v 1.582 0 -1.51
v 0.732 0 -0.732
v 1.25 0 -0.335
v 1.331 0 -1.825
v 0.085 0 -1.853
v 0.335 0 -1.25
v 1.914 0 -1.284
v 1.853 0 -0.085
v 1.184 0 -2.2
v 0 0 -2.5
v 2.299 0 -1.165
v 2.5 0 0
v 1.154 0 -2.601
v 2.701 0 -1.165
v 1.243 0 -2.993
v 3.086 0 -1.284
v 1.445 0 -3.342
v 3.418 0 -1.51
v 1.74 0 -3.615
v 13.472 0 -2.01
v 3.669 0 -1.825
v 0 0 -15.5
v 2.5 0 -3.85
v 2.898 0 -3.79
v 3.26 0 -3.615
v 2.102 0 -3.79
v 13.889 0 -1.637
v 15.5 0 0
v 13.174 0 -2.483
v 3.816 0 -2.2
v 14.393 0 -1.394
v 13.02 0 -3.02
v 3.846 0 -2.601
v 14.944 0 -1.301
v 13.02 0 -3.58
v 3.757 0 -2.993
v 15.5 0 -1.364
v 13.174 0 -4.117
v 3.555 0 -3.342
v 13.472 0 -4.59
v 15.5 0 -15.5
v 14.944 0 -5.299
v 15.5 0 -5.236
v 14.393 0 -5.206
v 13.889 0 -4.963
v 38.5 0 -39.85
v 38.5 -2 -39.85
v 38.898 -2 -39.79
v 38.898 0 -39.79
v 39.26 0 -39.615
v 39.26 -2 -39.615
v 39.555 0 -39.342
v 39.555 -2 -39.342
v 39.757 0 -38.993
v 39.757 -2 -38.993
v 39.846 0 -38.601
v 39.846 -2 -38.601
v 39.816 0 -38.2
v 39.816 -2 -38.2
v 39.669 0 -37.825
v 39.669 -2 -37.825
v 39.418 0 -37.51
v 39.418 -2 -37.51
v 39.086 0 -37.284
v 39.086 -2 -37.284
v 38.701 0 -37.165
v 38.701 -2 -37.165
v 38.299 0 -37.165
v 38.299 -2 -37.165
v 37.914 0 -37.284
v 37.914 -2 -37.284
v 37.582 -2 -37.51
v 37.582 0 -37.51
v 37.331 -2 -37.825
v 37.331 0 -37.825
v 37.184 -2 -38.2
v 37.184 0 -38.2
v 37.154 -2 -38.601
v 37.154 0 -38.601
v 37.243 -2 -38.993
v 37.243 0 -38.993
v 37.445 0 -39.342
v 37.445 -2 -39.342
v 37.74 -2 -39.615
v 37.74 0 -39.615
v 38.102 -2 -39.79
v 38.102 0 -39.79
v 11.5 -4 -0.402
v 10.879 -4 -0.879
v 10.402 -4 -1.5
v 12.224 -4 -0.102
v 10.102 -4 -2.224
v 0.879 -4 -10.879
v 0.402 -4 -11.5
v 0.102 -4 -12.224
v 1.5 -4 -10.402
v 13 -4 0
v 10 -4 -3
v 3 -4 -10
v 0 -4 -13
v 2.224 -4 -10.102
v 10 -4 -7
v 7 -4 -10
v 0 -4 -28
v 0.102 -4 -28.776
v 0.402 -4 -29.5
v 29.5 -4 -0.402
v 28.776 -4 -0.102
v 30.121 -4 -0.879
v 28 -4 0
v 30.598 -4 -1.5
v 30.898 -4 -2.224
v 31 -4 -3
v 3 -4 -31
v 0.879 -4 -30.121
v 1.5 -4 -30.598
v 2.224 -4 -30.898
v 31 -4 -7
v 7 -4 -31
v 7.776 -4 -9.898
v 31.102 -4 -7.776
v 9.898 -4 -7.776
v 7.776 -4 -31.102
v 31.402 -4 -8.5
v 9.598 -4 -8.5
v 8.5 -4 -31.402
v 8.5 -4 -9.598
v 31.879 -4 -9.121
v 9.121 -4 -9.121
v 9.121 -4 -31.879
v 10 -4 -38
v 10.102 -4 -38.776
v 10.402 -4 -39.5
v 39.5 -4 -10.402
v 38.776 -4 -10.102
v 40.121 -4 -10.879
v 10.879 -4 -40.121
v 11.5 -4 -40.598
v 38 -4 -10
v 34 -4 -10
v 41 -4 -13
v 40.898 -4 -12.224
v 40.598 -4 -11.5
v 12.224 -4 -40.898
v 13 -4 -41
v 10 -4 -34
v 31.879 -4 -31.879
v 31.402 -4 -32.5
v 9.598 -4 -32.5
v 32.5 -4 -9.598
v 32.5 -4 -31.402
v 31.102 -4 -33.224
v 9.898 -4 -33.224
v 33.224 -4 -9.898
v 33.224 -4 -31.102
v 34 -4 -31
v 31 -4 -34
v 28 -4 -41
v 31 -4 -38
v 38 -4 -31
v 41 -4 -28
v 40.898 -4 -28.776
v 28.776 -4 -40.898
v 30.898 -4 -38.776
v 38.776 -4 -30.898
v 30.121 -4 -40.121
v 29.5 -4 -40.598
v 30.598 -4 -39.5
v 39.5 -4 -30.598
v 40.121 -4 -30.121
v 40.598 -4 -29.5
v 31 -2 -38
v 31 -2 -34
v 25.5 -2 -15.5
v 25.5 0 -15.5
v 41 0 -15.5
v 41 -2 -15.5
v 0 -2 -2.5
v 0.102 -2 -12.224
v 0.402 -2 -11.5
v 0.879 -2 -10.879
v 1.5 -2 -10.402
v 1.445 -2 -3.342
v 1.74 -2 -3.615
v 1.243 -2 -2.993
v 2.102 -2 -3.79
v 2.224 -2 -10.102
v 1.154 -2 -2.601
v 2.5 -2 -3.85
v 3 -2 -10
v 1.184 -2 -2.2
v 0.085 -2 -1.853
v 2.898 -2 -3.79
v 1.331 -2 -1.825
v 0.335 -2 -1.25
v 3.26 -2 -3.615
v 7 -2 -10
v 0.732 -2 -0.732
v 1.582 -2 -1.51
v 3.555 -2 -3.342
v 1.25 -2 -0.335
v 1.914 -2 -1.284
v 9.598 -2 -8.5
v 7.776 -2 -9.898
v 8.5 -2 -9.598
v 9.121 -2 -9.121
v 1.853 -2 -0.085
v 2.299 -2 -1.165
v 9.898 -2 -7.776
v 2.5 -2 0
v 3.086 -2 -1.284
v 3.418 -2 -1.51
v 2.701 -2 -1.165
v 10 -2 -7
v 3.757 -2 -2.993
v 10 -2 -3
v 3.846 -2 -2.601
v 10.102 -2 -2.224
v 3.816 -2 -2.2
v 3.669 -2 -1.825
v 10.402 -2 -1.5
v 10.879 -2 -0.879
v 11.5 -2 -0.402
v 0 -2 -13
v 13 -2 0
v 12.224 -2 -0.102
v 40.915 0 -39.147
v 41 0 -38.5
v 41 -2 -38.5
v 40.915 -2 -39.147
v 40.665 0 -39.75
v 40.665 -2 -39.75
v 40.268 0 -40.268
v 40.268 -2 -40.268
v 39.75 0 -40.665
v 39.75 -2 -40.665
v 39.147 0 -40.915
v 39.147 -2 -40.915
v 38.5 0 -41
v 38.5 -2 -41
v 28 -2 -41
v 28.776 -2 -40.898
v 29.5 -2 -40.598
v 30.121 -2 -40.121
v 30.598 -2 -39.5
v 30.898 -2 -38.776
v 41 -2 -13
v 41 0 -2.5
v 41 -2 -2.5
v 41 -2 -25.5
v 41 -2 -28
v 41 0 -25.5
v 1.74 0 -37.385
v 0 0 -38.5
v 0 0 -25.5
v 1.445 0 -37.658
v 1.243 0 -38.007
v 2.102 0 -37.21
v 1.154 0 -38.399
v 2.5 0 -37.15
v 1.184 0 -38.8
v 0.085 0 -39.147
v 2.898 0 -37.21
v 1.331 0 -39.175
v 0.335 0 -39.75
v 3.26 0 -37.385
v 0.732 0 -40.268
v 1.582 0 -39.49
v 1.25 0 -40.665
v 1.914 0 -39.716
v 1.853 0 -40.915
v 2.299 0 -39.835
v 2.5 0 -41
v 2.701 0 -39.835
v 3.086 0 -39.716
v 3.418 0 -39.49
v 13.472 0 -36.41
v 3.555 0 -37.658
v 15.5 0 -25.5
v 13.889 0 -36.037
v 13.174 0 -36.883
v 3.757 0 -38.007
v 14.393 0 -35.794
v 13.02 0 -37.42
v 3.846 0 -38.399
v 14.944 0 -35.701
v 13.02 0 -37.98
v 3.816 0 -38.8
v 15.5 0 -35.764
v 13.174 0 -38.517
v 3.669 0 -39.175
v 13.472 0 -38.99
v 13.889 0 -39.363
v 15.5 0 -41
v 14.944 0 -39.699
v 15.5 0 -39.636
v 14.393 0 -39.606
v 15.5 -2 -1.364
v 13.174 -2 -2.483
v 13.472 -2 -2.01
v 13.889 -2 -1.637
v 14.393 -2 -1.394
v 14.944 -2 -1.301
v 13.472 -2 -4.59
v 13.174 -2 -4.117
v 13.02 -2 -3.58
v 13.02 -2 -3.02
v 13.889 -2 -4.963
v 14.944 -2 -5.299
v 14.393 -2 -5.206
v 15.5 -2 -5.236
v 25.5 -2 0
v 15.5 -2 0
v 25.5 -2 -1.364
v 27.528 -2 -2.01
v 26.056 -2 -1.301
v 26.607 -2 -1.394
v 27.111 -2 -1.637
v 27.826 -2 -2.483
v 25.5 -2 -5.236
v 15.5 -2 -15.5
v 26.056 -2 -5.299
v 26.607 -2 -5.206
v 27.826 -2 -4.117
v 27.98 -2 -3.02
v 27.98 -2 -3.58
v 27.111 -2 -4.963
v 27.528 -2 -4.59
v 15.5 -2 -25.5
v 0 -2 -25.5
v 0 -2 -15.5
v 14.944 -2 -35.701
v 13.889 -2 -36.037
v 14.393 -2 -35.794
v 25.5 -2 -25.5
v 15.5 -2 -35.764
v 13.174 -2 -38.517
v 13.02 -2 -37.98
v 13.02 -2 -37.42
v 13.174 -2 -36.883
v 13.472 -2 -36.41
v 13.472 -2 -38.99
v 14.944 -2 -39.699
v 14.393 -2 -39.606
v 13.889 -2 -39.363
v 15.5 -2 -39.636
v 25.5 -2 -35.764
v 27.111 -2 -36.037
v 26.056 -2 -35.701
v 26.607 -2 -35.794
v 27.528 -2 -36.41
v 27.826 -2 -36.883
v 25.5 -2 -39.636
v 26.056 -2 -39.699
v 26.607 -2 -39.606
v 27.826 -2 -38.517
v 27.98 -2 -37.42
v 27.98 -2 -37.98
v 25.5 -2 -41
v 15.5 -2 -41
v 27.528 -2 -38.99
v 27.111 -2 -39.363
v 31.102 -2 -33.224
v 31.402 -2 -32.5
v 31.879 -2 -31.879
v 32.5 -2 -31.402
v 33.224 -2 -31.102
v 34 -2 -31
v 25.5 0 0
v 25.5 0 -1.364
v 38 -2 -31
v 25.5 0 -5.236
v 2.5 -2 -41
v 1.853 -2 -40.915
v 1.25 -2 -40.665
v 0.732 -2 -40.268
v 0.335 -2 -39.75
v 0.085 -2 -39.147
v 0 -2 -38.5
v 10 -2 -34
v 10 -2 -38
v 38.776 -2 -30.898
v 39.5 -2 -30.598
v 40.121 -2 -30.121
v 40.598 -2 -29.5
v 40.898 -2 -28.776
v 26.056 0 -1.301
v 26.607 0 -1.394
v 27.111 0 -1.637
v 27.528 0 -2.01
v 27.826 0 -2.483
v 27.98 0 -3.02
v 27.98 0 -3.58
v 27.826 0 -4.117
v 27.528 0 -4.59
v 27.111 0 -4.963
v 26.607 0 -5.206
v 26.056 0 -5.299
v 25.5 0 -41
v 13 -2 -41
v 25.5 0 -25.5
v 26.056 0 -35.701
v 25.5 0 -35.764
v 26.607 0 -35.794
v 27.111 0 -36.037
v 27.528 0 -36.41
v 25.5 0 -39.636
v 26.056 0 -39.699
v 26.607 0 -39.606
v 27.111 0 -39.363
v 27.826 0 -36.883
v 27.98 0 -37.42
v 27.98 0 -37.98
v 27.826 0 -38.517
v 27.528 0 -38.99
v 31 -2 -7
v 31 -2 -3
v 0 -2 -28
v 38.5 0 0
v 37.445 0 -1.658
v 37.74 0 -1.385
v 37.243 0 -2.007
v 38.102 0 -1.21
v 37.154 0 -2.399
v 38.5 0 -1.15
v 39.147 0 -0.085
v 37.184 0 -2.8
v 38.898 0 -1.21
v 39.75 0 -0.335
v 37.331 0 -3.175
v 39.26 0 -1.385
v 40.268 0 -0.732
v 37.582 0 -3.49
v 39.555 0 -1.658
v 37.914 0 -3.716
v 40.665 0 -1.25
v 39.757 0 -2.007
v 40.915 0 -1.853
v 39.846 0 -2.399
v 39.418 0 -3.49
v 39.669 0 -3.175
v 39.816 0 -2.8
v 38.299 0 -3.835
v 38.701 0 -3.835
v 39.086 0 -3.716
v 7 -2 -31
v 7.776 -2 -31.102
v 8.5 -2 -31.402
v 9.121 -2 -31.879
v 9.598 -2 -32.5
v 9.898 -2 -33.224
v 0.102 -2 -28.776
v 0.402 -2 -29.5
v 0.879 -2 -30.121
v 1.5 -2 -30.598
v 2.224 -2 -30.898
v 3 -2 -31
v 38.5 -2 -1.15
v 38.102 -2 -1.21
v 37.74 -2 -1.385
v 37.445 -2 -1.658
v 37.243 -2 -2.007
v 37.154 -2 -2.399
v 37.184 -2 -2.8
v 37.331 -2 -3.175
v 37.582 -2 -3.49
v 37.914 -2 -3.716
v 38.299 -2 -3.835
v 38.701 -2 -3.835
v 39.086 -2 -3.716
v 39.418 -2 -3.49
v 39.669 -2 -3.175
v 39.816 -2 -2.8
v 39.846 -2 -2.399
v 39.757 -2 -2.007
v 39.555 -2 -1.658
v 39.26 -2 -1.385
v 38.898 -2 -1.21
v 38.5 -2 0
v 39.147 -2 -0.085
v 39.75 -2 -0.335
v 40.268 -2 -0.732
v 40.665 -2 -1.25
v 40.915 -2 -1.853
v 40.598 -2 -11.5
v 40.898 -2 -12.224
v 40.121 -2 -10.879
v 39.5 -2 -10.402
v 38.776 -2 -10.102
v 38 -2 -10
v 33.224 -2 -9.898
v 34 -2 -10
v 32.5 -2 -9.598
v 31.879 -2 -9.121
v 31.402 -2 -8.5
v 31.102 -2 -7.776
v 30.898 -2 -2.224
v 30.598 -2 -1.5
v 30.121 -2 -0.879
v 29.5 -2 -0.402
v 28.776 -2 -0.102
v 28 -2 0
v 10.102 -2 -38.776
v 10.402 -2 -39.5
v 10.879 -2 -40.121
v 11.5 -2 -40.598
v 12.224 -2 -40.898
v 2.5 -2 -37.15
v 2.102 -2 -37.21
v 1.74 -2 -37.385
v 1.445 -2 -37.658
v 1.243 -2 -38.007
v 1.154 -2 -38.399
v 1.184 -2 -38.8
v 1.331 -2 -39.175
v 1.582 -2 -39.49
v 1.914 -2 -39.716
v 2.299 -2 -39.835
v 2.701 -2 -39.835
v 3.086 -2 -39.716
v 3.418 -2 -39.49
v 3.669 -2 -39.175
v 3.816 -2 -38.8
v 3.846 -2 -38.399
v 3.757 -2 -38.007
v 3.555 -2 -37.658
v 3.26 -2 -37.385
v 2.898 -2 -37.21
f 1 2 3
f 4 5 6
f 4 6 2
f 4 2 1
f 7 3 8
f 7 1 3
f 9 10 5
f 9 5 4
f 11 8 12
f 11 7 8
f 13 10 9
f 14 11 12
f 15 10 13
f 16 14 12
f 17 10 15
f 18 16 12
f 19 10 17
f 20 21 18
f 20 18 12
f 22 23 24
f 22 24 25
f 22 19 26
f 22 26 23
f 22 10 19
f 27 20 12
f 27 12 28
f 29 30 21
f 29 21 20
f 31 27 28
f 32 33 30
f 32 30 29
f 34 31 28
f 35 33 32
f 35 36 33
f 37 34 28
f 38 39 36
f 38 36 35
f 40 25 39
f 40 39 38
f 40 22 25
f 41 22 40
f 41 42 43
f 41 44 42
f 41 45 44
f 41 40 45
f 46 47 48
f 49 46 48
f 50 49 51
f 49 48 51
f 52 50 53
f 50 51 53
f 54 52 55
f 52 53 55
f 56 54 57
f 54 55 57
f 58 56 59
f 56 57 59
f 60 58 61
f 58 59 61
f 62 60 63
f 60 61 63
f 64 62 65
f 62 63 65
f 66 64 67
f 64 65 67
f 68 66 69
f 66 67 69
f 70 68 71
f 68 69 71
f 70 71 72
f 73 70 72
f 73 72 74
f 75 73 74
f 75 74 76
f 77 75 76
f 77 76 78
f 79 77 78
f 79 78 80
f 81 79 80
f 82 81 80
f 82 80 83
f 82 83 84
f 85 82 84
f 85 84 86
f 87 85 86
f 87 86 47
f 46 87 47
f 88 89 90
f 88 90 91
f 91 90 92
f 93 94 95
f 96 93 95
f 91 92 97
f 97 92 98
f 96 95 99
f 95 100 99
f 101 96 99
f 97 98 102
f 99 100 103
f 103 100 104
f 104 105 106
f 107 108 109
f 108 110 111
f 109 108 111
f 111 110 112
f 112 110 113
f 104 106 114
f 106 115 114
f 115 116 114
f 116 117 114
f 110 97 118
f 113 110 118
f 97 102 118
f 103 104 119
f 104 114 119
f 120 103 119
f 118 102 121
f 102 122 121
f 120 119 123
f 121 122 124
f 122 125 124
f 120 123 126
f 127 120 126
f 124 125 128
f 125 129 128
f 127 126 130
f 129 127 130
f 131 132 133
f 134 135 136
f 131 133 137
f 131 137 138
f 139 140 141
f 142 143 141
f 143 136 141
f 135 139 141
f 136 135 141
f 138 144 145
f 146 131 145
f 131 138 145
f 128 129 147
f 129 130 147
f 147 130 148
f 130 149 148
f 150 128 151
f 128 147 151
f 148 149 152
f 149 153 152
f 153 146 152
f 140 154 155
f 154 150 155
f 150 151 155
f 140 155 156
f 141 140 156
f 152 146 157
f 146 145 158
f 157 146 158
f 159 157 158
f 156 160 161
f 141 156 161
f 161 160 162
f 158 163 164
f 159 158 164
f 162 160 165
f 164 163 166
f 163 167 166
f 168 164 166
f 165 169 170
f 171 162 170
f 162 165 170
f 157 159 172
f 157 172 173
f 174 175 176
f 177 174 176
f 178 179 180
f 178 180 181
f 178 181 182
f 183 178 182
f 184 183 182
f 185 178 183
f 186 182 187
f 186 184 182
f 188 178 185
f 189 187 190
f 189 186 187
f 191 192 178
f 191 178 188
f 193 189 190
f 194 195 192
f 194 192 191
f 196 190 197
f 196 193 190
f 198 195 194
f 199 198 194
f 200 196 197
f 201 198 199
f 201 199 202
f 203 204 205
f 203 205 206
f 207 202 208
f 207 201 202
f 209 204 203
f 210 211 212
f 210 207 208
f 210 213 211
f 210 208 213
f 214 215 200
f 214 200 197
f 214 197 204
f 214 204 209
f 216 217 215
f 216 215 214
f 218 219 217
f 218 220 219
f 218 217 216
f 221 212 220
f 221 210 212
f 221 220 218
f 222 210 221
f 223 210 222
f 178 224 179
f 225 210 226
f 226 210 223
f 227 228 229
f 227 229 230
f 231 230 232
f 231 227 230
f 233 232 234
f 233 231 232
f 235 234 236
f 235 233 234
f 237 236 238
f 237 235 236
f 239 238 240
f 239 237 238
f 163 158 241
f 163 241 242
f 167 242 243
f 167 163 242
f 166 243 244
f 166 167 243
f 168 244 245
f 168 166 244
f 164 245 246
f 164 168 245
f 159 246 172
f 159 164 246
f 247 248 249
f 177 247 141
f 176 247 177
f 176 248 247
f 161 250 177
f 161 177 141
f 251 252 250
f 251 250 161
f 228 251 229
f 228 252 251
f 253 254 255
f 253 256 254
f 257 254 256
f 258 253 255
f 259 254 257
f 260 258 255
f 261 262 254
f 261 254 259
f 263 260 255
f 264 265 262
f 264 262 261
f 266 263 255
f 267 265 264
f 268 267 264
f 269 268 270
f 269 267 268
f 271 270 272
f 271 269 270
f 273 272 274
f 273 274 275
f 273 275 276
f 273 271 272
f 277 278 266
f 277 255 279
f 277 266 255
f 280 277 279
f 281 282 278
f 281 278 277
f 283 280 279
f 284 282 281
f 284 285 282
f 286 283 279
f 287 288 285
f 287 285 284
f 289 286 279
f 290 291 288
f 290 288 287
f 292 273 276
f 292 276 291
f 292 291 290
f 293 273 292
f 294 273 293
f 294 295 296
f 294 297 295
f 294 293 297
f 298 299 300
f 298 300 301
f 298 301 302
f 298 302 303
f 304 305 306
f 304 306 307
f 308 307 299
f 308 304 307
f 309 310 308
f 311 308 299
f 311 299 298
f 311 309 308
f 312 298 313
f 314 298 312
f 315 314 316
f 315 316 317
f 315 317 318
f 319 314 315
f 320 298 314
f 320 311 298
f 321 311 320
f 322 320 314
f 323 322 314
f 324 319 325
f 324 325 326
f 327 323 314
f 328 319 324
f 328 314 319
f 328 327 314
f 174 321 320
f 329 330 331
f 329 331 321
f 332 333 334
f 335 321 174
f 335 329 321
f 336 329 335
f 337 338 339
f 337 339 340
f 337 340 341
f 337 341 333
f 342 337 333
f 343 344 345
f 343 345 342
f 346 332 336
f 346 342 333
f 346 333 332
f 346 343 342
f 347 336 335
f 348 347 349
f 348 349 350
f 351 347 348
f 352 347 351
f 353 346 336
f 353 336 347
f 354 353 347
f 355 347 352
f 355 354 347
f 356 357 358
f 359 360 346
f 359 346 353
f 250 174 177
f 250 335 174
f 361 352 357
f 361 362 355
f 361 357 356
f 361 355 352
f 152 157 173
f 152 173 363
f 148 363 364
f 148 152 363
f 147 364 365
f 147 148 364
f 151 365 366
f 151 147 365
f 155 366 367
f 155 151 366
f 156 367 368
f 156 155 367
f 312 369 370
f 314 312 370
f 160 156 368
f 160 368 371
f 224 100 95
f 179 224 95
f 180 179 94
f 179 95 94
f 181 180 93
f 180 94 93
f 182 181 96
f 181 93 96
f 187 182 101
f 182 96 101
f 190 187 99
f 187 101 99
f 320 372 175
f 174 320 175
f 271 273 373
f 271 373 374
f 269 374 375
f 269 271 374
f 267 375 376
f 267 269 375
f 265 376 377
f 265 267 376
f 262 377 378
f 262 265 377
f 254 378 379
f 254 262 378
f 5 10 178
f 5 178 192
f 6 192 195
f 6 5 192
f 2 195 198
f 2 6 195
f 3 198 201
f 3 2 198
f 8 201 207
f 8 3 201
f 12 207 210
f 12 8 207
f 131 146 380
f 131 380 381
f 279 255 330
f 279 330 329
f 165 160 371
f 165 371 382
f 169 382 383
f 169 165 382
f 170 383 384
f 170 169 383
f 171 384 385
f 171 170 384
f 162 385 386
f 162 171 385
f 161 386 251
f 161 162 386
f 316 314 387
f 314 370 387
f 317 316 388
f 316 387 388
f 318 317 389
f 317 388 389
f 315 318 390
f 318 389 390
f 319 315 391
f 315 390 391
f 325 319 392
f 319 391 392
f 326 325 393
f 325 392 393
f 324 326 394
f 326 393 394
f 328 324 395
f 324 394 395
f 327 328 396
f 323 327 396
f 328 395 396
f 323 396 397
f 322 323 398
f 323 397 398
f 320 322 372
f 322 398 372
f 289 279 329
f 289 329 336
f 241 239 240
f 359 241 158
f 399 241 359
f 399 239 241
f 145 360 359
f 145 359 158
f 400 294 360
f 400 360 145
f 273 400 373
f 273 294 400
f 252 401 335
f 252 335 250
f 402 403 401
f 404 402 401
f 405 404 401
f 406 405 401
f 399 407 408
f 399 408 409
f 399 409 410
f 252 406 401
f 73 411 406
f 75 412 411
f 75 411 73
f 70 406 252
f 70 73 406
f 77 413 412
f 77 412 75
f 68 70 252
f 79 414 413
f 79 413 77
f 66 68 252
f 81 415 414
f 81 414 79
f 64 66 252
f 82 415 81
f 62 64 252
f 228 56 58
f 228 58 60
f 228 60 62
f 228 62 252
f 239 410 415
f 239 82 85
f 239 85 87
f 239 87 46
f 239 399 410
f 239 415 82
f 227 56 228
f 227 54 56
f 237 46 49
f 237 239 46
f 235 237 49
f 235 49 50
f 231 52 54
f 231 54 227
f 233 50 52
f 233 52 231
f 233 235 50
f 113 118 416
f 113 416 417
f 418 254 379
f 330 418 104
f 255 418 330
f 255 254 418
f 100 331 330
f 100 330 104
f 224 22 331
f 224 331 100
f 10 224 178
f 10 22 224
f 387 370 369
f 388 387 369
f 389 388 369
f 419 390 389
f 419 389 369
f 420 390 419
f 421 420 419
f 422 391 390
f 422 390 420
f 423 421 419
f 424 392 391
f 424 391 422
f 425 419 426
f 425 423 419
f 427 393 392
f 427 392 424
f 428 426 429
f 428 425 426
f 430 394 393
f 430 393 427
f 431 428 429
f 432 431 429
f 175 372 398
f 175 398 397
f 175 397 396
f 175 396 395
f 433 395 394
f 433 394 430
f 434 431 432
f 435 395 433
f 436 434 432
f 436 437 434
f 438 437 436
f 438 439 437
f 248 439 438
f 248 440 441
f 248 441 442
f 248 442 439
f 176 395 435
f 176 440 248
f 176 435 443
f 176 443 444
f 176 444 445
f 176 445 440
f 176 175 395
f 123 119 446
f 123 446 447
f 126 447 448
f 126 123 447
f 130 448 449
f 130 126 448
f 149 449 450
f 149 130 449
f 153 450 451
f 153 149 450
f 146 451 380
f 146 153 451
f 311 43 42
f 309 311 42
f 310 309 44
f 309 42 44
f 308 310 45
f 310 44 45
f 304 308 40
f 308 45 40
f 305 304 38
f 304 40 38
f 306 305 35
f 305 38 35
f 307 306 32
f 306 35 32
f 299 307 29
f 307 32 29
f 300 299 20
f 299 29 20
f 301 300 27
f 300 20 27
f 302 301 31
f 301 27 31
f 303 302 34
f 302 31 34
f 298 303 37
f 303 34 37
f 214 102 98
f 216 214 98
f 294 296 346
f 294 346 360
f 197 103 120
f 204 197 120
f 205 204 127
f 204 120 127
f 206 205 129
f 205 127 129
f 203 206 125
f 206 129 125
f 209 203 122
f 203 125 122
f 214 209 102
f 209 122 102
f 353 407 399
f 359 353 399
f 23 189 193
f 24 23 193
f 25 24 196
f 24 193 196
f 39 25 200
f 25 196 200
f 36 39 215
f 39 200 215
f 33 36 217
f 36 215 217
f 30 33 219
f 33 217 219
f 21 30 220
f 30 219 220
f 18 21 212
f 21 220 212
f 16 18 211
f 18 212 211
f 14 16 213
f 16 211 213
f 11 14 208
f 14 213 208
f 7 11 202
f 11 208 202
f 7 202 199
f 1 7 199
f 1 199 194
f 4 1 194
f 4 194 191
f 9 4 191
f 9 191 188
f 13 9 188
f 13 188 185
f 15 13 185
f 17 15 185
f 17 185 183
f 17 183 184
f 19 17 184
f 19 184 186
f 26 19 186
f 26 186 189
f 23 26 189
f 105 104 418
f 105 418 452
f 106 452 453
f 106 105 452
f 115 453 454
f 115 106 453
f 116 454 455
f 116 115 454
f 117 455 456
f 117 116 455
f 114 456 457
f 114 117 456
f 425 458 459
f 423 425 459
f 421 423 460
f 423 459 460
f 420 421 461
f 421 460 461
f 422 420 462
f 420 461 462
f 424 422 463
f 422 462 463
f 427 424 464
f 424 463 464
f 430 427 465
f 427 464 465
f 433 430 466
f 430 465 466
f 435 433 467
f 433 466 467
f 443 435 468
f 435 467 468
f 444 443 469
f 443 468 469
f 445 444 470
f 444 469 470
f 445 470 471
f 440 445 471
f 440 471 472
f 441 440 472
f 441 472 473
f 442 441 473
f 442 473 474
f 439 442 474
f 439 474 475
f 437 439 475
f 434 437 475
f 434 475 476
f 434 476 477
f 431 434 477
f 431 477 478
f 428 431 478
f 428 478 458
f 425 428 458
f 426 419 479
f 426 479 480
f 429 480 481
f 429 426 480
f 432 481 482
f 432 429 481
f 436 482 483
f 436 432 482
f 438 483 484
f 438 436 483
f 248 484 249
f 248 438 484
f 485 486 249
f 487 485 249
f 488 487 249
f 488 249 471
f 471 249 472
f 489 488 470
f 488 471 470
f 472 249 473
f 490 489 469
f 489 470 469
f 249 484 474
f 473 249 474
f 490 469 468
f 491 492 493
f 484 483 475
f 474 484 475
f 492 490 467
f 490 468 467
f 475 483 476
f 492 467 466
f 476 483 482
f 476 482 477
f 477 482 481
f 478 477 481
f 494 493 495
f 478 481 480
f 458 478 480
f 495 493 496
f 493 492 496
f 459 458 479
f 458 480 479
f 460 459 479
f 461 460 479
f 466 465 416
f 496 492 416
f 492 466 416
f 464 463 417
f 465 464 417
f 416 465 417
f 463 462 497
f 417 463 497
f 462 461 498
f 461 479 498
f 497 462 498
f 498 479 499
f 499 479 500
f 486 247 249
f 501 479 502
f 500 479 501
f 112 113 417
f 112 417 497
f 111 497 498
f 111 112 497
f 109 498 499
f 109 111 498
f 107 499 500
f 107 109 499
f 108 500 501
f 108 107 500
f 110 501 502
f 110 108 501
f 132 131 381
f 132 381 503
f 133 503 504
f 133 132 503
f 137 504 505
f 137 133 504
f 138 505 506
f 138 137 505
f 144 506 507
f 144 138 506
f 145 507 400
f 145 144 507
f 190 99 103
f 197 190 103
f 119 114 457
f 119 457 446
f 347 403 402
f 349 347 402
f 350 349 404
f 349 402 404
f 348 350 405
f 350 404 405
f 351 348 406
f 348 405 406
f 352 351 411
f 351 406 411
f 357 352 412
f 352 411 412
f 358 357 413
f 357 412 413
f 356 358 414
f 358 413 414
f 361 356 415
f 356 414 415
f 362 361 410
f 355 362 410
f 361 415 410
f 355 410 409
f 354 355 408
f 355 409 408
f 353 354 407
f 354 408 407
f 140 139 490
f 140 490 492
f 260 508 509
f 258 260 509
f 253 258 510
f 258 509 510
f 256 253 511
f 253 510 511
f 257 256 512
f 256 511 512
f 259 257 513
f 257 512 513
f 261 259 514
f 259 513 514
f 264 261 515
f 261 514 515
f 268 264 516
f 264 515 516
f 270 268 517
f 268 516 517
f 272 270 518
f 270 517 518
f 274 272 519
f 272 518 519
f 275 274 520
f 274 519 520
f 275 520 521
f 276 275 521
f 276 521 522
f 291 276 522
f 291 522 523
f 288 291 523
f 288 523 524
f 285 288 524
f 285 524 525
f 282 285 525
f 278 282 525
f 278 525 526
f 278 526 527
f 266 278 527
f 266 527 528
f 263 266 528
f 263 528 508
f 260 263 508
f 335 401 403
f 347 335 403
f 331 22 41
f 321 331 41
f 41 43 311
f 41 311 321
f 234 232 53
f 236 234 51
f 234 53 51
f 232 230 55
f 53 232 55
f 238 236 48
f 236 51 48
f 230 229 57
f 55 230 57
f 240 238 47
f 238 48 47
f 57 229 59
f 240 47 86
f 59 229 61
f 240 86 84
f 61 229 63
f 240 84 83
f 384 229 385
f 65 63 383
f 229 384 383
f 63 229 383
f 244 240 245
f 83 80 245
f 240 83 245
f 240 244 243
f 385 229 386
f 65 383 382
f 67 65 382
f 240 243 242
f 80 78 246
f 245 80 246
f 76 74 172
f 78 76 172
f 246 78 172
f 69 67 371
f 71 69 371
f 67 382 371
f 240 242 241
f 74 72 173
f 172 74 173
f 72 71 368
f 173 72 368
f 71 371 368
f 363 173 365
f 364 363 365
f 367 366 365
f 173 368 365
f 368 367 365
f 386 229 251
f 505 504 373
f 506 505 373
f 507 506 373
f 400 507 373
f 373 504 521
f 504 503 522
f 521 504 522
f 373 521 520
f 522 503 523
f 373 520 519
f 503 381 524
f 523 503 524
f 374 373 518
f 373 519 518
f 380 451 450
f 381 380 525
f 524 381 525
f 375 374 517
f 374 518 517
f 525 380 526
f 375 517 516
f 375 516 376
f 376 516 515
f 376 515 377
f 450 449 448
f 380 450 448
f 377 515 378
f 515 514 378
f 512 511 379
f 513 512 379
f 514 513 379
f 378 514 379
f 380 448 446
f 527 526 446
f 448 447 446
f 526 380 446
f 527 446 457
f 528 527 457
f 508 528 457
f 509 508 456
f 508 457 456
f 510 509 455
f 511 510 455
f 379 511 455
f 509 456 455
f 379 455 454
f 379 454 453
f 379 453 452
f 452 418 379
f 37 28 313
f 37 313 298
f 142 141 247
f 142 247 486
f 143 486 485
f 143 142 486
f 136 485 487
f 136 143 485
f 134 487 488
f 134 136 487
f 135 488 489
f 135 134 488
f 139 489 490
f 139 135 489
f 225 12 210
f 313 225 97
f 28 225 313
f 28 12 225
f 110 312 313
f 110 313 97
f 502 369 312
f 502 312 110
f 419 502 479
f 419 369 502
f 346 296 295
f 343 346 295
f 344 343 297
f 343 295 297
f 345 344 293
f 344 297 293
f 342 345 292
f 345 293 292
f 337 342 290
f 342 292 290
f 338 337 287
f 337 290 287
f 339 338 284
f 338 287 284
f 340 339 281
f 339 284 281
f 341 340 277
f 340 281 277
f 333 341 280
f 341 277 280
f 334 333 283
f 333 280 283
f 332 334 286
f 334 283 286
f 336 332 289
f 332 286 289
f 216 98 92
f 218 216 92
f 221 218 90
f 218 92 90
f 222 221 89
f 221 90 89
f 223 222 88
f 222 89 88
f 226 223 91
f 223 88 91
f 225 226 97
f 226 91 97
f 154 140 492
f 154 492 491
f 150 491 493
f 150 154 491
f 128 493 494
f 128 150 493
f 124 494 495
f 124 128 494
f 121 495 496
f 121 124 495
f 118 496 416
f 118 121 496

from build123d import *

# Parameters (mm, degrees)
EXTRUDE_1_DEPTH     = 4
SKETCH_2_R          = 1.35
CUT_EXTRUDE_1_DEPTH = 4
CUT_EXTRUDE_2_DEPTH = 2
SKETCH_4_W          = 46
SKETCH_4_H          = 10
CUT_EXTRUDE_3_DEPTH = 2
SKETCH_6_W          = 10
SKETCH_6_H          = 25
CUT_EXTRUDE_4_DEPTH = 2
SKETCH_7_R          = 2
CUT_EXTRUDE_5_DEPTH = 2


with BuildPart() as part:
    # 草图1 → 凸台-拉伸1 (new body)
    with BuildSketch(Plane(origin=(0, 0, 0), x_dir=(1, 0, 0), z_dir=(0, 1, 0))):
        with BuildLine():
            Line((2.5, 0), (38.5, 0))
            ThreePointArc((38.5, 0), (40.267766953, 0.732233047), (41, 2.5))
            Line((41, 2.5), (41, 38.5))
            ThreePointArc((41, 38.5), (40.267766953, 40.267766953), (38.5, 41))
            Line((38.5, 41), (2.5, 41))
            ThreePointArc((2.5, 41), (0.732233047, 40.267766953), (0, 38.5))
            Line((0, 38.5), (0, 2.5))
            ThreePointArc((0, 2.5), (0.732233047, 0.732233047), (2.5, 0))
        make_face()
    extrude(amount=-EXTRUDE_1_DEPTH)

    # 草图2 → 切除-拉伸1 (cut)
    with BuildSketch(Plane.XZ.offset(4)):
        with Locations(Location((2.5, -2.5, 0), (0, 0, 270))):
            Circle(SKETCH_2_R)
        with Locations(Location((38.5, -2.5, 0), (0, 0, 90))):
            Circle(SKETCH_2_R)
        with Locations(Location((2.5, -38.5, 0), (0, 0, 90))):
            Circle(SKETCH_2_R)
        with Locations(Location((38.5, -38.5, 0), (0, 0, 270))):
            Circle(SKETCH_2_R)
    extrude(amount=-CUT_EXTRUDE_1_DEPTH, mode=Mode.SUBTRACT)

    # 草图3 → 切除-拉伸2 (cut)
    with BuildSketch(Plane.XZ.offset(4)):
        with BuildLine():
            Line((0, -10), (0, -13))
            ThreePointArc((0, -13), (0.878679656, -10.878679656), (3, -10))
            Line((3, -10), (7, -10))
            ThreePointArc((7, -10), (9.121320344, -9.121320344), (10, -7))
            Line((10, -7), (10, -3))
            ThreePointArc((10, -3), (10.878679656, -0.878679656), (13, 0))
            Line((13, 0), (10, 0))
            Line((10, 0), (0, 0))
            Line((0, 0), (0, -10))
        make_face()
        with BuildLine():
            Line((41, 0), (41, -10))
            Line((41, -10), (41, -13))
            ThreePointArc((41, -13), (40.121320344, -10.878679656), (38, -10))
            Line((38, -10), (34, -10))
            ThreePointArc((34, -10), (31.878679656, -9.121320344), (31, -7))
            Line((31, -7), (31, -3))
            ThreePointArc((31, -3), (30.121320344, -0.878679656), (28, 0))
            Line((28, 0), (31, 0))
            Line((31, 0), (41, 0))
        make_face()
        with BuildLine():
            Line((41, -41), (31, -41))
            Line((31, -41), (28, -41))
            ThreePointArc((28, -41), (30.121320344, -40.121320344), (31, -38))
            Line((31, -38), (31, -34))
            ThreePointArc((31, -34), (31.878679656, -31.878679656), (34, -31))
            Line((34, -31), (38, -31))
            ThreePointArc((38, -31), (40.121320344, -30.121320344), (41, -28))
            Line((41, -28), (41, -31))
            Line((41, -31), (41, -41))
        make_face()
        with BuildLine():
            Line((0, -41), (0, -31))
            Line((0, -31), (0, -28))
            ThreePointArc((0, -28), (0.878679656, -30.121320344), (3, -31))
            Line((3, -31), (7, -31))
            ThreePointArc((7, -31), (9.121320344, -31.878679656), (10, -34))
            Line((10, -34), (10, -38))
            ThreePointArc((10, -38), (10.878679656, -40.121320344), (13, -41))
            Line((13, -41), (10, -41))
            Line((10, -41), (0, -41))
        make_face()
    extrude(amount=-CUT_EXTRUDE_2_DEPTH, mode=Mode.SUBTRACT)

    # 草图4 → 切除-拉伸3 (cut)
    with BuildSketch(Plane(origin=(0, 0, 0), x_dir=(1, 0, 0), z_dir=(0, 1, 0))):
        with Locations((20.5, 20.5)):
            Rectangle(SKETCH_4_W, SKETCH_4_H)
    extrude(amount=-CUT_EXTRUDE_3_DEPTH, mode=Mode.SUBTRACT)

    # 草图6 → 切除-拉伸4 (cut)
    with BuildSketch(Plane(origin=(0, 0, 0), x_dir=(1, 0, 0), z_dir=(0, 1, 0))):
        with Locations((20.5, 38)):
            Rectangle(SKETCH_6_W, SKETCH_6_H)
        with Locations((20.5, 3)):
            Rectangle(SKETCH_6_W, SKETCH_6_H)
    extrude(amount=-CUT_EXTRUDE_4_DEPTH, mode=Mode.SUBTRACT)

    # 草图7 → 切除-拉伸5 (cut)
    with BuildSketch(Plane(origin=(0, 0, 0), x_dir=(1, 0, 0), z_dir=(0, 1, 0))):
        with Locations((15, 37.7)):
            Circle(SKETCH_7_R)
        with Locations((26, 3.3)):
            Circle(SKETCH_7_R)
        with Locations((26, 37.7)):
            Circle(SKETCH_7_R)
        with Locations((15, 3.3)):
            Circle(SKETCH_7_R)
    extrude(amount=-CUT_EXTRUDE_5_DEPTH, mode=Mode.SUBTRACT)


solid = part.part
